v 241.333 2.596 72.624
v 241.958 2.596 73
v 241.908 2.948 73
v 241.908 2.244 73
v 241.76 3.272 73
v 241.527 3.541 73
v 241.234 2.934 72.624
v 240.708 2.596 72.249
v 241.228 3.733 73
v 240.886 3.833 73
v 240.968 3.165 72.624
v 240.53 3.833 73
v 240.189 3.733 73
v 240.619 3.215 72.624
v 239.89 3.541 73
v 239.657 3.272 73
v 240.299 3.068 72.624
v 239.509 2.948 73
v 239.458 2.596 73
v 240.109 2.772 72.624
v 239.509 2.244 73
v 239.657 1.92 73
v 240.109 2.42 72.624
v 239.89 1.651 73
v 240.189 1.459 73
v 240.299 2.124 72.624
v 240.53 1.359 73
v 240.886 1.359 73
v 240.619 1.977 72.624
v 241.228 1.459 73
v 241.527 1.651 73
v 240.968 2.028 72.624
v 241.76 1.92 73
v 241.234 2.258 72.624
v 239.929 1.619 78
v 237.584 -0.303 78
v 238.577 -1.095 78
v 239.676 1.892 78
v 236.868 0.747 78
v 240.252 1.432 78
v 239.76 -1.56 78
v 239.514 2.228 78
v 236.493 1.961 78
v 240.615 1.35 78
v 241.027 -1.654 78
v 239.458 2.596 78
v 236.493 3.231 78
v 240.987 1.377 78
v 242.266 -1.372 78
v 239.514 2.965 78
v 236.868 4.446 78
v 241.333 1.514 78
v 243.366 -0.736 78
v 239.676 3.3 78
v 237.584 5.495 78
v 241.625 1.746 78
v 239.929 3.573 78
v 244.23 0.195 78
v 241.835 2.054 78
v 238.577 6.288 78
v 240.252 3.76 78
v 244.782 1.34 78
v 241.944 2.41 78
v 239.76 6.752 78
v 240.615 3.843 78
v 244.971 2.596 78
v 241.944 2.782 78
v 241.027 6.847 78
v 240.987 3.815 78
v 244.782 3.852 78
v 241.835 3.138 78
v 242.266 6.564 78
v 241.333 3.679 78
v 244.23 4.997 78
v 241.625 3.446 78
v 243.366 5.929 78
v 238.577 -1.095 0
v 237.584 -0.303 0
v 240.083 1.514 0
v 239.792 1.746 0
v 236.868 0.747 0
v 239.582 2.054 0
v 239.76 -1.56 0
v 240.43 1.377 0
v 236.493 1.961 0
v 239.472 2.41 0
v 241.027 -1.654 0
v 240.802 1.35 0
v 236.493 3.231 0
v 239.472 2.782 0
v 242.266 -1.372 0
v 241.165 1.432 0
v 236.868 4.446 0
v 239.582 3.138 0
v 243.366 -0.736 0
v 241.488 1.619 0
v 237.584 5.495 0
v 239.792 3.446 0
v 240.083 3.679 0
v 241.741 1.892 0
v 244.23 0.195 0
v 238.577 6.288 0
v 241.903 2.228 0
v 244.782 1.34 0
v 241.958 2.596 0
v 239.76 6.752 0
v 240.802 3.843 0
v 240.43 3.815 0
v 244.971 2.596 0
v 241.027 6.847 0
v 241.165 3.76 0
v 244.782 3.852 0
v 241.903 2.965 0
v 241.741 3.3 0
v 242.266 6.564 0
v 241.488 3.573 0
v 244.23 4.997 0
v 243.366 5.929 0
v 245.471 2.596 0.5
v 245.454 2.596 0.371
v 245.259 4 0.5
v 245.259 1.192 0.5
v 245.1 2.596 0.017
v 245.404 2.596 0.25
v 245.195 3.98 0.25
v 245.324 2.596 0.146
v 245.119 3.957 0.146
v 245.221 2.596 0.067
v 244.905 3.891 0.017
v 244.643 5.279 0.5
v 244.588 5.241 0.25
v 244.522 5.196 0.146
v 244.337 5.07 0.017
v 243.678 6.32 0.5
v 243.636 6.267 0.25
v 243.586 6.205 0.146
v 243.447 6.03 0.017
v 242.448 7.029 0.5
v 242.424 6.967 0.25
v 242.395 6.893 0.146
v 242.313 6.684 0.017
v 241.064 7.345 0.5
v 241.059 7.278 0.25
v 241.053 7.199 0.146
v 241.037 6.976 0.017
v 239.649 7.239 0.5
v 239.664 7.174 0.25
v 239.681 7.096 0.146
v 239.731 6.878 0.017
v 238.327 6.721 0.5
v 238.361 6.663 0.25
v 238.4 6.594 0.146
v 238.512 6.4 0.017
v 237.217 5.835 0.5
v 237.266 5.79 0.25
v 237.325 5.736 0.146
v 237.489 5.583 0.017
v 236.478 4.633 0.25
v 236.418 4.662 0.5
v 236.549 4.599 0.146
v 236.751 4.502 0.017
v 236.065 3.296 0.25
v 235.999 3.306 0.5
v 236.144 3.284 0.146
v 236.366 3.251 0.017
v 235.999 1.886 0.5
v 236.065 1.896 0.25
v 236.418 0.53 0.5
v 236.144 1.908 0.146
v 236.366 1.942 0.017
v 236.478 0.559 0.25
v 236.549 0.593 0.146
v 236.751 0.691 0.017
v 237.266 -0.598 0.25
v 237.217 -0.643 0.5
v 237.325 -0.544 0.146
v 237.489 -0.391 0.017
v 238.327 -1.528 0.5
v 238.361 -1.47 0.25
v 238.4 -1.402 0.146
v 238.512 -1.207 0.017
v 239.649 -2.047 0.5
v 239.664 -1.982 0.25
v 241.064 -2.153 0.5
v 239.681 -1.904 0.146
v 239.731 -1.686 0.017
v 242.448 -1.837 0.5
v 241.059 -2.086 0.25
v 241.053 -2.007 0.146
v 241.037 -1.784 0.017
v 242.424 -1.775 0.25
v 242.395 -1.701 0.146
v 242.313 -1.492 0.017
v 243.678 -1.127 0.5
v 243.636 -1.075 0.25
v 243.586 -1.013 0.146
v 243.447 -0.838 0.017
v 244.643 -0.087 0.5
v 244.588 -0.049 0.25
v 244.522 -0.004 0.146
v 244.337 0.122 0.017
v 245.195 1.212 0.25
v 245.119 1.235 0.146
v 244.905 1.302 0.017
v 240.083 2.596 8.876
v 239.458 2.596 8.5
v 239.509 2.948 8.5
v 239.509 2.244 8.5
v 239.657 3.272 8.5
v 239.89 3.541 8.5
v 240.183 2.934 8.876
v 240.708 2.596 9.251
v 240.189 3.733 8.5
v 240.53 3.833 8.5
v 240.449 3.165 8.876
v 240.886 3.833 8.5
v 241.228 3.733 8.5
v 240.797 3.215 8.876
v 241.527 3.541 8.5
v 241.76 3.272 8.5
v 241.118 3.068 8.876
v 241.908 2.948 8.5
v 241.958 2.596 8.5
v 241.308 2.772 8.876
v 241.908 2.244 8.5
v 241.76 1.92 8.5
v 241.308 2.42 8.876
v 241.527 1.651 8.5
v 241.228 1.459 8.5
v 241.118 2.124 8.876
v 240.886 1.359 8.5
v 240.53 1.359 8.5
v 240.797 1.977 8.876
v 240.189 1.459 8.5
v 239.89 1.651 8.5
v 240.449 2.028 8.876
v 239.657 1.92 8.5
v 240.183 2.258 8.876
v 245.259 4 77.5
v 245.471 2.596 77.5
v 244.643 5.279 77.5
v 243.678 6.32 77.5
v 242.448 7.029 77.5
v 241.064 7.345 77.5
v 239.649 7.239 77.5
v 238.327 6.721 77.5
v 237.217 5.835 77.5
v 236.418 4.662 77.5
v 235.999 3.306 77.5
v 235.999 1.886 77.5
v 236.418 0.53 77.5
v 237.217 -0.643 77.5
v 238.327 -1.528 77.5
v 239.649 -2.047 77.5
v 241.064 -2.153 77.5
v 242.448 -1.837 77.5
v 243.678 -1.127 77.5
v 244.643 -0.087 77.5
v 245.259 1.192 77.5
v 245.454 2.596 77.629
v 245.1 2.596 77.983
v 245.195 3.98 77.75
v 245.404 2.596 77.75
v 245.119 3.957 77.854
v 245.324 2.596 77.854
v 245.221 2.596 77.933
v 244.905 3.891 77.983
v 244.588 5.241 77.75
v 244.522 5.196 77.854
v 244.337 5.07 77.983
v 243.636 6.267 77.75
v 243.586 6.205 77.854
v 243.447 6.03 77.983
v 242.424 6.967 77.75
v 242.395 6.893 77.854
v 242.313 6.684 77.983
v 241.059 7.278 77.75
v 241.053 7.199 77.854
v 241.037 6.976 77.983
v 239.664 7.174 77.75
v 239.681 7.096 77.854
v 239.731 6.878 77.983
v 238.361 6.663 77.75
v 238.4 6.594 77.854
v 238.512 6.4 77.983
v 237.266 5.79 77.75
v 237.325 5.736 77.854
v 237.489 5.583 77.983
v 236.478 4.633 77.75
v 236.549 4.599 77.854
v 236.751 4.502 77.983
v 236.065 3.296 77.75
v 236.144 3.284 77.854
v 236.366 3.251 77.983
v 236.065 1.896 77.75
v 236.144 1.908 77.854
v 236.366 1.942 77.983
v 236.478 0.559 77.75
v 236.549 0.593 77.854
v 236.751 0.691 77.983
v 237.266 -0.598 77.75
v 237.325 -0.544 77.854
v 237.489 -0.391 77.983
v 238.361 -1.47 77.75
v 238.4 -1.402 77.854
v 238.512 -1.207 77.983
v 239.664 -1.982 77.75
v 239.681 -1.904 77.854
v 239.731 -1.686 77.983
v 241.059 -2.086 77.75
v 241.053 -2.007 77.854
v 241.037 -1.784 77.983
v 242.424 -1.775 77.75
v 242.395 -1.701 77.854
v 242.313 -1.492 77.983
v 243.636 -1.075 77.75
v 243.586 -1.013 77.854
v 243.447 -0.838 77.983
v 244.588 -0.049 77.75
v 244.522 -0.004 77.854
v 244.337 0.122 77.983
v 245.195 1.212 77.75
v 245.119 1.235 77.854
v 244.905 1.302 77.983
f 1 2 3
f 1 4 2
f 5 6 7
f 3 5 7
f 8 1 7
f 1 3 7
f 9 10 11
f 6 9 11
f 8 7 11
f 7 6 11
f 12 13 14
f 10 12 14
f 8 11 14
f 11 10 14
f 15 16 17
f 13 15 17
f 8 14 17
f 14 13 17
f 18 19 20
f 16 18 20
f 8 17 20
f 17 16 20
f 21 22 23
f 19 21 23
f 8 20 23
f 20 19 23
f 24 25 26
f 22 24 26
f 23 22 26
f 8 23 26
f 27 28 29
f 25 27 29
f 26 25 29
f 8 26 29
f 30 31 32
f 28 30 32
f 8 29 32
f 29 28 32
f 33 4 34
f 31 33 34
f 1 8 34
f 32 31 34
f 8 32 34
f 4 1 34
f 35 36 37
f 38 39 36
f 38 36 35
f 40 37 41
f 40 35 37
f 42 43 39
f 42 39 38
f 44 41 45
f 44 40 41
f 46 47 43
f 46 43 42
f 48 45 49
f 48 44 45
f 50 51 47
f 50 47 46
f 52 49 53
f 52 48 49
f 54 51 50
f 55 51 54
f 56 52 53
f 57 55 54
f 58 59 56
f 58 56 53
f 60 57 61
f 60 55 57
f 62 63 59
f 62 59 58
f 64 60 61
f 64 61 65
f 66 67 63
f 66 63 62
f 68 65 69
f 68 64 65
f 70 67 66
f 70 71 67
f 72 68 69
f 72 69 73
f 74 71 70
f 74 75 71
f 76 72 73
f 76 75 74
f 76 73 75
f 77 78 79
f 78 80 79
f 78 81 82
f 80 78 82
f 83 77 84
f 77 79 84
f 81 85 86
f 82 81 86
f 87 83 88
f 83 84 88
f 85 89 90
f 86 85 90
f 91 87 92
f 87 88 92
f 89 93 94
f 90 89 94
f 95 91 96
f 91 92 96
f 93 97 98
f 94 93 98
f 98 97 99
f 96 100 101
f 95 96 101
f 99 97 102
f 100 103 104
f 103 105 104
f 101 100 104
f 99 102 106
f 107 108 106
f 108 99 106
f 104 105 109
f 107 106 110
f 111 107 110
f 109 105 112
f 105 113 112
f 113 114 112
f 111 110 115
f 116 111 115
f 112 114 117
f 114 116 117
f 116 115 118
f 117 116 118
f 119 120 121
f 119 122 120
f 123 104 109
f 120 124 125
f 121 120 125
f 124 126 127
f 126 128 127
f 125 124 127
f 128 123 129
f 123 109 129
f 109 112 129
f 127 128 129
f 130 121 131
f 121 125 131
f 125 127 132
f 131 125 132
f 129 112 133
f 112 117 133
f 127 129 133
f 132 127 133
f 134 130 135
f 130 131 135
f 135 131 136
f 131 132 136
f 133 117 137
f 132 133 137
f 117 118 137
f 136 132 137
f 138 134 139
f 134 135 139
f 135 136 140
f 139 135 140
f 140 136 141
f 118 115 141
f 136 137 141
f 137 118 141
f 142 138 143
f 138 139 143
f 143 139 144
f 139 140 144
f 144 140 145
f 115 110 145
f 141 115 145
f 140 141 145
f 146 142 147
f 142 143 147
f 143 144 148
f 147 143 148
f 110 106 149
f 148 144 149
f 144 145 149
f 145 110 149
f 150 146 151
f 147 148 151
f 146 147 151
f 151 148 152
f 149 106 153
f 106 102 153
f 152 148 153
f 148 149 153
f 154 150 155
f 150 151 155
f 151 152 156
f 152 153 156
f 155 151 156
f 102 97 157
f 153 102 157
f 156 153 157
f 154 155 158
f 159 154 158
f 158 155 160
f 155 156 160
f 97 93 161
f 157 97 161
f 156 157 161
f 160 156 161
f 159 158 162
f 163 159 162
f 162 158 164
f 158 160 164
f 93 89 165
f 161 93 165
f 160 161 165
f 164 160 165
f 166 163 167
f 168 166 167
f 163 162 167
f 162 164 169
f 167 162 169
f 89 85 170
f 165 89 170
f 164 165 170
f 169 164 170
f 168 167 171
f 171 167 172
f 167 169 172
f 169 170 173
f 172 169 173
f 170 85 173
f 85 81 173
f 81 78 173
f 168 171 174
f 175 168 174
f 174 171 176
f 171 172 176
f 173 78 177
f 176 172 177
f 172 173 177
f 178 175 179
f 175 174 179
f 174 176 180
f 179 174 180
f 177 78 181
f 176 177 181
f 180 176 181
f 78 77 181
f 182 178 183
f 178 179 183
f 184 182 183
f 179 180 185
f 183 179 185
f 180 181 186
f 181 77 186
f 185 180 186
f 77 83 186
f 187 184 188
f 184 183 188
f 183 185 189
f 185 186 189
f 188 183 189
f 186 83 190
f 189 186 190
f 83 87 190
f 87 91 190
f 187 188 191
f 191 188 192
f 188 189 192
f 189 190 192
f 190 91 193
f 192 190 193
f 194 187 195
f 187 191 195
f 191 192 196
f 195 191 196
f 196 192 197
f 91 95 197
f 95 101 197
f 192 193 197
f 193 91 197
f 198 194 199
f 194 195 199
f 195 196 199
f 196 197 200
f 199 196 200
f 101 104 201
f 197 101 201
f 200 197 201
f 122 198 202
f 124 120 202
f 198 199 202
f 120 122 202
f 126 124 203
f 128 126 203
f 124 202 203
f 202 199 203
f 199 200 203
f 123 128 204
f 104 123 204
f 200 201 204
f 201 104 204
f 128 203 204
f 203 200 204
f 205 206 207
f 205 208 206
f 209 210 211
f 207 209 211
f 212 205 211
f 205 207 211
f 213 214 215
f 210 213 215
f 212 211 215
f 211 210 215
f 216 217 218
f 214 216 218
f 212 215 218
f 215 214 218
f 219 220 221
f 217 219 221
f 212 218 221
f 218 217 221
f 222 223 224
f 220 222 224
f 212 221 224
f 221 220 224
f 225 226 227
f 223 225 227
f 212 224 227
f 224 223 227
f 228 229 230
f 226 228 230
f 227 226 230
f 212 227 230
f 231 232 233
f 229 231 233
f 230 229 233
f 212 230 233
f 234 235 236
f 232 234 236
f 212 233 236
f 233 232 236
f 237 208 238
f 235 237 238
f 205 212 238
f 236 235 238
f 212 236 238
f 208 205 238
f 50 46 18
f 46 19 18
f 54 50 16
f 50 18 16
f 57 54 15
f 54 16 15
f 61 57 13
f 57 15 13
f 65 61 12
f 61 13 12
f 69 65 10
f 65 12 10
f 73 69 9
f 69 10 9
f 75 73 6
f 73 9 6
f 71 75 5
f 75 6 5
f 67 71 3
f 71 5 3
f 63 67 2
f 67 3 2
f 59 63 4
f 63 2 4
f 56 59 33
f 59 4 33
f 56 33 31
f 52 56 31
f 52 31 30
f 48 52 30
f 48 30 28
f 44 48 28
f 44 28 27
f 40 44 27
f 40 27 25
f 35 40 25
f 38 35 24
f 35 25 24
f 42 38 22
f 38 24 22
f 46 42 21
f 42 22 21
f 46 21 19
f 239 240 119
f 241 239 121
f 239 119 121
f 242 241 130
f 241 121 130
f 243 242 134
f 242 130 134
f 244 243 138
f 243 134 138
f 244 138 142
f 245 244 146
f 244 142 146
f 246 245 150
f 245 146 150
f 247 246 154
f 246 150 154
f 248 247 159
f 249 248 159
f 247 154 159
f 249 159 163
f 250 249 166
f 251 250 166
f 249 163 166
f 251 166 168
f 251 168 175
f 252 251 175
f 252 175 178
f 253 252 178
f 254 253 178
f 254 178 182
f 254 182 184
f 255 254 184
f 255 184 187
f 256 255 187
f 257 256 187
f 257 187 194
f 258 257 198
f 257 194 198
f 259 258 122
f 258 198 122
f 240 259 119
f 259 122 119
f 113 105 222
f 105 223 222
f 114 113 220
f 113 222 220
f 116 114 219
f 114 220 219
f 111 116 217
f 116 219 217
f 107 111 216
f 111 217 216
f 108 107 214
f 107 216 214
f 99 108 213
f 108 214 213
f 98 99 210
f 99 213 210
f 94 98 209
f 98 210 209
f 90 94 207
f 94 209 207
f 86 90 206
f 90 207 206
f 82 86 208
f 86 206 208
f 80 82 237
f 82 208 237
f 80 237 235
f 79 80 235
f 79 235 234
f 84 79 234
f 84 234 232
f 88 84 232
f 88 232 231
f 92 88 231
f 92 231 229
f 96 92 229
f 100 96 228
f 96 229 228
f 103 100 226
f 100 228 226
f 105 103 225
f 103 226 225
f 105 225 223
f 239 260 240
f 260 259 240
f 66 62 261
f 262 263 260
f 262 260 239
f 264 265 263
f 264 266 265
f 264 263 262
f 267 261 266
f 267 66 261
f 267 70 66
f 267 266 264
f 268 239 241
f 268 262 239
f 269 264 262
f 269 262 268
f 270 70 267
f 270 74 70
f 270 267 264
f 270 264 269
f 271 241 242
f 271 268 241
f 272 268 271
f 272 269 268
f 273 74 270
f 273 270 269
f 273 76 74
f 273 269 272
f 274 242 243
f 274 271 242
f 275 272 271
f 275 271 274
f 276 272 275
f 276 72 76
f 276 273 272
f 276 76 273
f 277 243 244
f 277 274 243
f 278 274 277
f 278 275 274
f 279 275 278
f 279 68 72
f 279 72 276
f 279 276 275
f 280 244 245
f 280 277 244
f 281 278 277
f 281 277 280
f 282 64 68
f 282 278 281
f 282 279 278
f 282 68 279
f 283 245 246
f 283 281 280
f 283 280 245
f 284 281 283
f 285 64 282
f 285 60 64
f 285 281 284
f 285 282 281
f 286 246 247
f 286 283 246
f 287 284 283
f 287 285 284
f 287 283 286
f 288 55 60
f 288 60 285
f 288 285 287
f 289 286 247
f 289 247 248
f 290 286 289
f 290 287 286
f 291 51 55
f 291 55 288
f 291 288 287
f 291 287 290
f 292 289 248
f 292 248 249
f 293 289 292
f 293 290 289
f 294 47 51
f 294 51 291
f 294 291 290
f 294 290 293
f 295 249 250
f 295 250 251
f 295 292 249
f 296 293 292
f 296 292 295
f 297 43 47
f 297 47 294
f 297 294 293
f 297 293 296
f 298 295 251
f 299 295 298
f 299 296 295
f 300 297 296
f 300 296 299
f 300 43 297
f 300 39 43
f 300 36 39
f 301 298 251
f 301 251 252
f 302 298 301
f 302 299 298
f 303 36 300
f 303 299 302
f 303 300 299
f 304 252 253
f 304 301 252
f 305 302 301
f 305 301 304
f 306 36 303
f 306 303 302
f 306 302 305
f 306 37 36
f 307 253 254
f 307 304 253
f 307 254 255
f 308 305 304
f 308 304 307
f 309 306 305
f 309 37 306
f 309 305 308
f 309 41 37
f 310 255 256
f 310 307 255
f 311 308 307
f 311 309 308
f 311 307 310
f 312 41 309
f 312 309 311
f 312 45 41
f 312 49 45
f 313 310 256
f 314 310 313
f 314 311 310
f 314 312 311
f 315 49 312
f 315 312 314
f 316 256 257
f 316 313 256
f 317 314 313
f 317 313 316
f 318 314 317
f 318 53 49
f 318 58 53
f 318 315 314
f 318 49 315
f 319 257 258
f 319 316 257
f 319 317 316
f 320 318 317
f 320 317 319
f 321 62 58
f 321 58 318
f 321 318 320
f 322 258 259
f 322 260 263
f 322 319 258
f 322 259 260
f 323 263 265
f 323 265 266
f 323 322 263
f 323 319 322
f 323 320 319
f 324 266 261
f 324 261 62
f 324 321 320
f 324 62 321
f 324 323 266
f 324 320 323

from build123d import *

# Parameters (mm, degrees)
ESBO_O1_R                                      = 4.7625
RESSALTO_EXTRUS_O1_DEPTH                       = 78
FURO_ROSCADO_DE_M3X0_52_D                      = 2.5
FURO_ROSCADO_DE_M3X0_52_DEPTH                  = 8.5
FURO_ROSCADO_DE_M3X0_52_TIP                    = 0.751075774
FILETE1_R                                      = 0.5
BROCA_DE_ROSQUEAR_PARA_TARRAXA_DE_M3X0_5_D     = 2.5
BROCA_DE_ROSQUEAR_PARA_TARRAXA_DE_M3X0_5_DEPTH = 5
BROCA_DE_ROSQUEAR_PARA_TARRAXA_DE_M3X0_5_TIP   = 0.751075774
FILETE2_R                                      = 0.5


with BuildPart() as part:
    # Esboço1 → Ressalto-extrusão1 (new body)
    with BuildSketch(Plane.XY):
        with Locations((240.708388302, 2.596082859)):
            Circle(ESBO_O1_R)
    extrude(amount=RESSALTO_EXTRUS_O1_DEPTH)

    # Furo roscado de M3x0.52
    with Locations(Plane(origin=(0, 0, 0), x_dir=(-1, 0, 0), z_dir=(0, 0, -1))):
        with Locations((-240.708388302, 2.596082859)):
            Hole(FURO_ROSCADO_DE_M3X0_52_D / 2, depth=FURO_ROSCADO_DE_M3X0_52_DEPTH)
            with Locations((0, 0, -(FURO_ROSCADO_DE_M3X0_52_DEPTH + FURO_ROSCADO_DE_M3X0_52_TIP / 2))):  # 118° drill point
                Cone(0, FURO_ROSCADO_DE_M3X0_52_D / 2, FURO_ROSCADO_DE_M3X0_52_TIP, mode=Mode.SUBTRACT)

    # Filete1
    filete1_edges = [part.edges().sort_by_distance(p)[0] for p in [
        (235.945888302, 2.596082859, 0),
    ]]
    fillet(filete1_edges, radius=FILETE1_R)

    # Broca de rosquear para tarraxa de M3x0.51
    with Locations(Plane.XY.offset(78)):
        with Locations((240.708388302, 2.596082859)):
            Hole(BROCA_DE_ROSQUEAR_PARA_TARRAXA_DE_M3X0_5_D / 2, depth=BROCA_DE_ROSQUEAR_PARA_TARRAXA_DE_M3X0_5_DEPTH)
            with Locations((0, 0, -(BROCA_DE_ROSQUEAR_PARA_TARRAXA_DE_M3X0_5_DEPTH + BROCA_DE_ROSQUEAR_PARA_TARRAXA_DE_M3X0_5_TIP / 2))):  # 118° drill point
                Cone(0, BROCA_DE_ROSQUEAR_PARA_TARRAXA_DE_M3X0_5_D / 2, BROCA_DE_ROSQUEAR_PARA_TARRAXA_DE_M3X0_5_TIP, mode=Mode.SUBTRACT)

    # Filete2
    filete2_edges = [part.edges().sort_by_distance(p)[0] for p in [
        (235.945888302, 2.596082859, 78),
    ]]
    fillet(filete2_edges, radius=FILETE2_R)


solid = part.part
